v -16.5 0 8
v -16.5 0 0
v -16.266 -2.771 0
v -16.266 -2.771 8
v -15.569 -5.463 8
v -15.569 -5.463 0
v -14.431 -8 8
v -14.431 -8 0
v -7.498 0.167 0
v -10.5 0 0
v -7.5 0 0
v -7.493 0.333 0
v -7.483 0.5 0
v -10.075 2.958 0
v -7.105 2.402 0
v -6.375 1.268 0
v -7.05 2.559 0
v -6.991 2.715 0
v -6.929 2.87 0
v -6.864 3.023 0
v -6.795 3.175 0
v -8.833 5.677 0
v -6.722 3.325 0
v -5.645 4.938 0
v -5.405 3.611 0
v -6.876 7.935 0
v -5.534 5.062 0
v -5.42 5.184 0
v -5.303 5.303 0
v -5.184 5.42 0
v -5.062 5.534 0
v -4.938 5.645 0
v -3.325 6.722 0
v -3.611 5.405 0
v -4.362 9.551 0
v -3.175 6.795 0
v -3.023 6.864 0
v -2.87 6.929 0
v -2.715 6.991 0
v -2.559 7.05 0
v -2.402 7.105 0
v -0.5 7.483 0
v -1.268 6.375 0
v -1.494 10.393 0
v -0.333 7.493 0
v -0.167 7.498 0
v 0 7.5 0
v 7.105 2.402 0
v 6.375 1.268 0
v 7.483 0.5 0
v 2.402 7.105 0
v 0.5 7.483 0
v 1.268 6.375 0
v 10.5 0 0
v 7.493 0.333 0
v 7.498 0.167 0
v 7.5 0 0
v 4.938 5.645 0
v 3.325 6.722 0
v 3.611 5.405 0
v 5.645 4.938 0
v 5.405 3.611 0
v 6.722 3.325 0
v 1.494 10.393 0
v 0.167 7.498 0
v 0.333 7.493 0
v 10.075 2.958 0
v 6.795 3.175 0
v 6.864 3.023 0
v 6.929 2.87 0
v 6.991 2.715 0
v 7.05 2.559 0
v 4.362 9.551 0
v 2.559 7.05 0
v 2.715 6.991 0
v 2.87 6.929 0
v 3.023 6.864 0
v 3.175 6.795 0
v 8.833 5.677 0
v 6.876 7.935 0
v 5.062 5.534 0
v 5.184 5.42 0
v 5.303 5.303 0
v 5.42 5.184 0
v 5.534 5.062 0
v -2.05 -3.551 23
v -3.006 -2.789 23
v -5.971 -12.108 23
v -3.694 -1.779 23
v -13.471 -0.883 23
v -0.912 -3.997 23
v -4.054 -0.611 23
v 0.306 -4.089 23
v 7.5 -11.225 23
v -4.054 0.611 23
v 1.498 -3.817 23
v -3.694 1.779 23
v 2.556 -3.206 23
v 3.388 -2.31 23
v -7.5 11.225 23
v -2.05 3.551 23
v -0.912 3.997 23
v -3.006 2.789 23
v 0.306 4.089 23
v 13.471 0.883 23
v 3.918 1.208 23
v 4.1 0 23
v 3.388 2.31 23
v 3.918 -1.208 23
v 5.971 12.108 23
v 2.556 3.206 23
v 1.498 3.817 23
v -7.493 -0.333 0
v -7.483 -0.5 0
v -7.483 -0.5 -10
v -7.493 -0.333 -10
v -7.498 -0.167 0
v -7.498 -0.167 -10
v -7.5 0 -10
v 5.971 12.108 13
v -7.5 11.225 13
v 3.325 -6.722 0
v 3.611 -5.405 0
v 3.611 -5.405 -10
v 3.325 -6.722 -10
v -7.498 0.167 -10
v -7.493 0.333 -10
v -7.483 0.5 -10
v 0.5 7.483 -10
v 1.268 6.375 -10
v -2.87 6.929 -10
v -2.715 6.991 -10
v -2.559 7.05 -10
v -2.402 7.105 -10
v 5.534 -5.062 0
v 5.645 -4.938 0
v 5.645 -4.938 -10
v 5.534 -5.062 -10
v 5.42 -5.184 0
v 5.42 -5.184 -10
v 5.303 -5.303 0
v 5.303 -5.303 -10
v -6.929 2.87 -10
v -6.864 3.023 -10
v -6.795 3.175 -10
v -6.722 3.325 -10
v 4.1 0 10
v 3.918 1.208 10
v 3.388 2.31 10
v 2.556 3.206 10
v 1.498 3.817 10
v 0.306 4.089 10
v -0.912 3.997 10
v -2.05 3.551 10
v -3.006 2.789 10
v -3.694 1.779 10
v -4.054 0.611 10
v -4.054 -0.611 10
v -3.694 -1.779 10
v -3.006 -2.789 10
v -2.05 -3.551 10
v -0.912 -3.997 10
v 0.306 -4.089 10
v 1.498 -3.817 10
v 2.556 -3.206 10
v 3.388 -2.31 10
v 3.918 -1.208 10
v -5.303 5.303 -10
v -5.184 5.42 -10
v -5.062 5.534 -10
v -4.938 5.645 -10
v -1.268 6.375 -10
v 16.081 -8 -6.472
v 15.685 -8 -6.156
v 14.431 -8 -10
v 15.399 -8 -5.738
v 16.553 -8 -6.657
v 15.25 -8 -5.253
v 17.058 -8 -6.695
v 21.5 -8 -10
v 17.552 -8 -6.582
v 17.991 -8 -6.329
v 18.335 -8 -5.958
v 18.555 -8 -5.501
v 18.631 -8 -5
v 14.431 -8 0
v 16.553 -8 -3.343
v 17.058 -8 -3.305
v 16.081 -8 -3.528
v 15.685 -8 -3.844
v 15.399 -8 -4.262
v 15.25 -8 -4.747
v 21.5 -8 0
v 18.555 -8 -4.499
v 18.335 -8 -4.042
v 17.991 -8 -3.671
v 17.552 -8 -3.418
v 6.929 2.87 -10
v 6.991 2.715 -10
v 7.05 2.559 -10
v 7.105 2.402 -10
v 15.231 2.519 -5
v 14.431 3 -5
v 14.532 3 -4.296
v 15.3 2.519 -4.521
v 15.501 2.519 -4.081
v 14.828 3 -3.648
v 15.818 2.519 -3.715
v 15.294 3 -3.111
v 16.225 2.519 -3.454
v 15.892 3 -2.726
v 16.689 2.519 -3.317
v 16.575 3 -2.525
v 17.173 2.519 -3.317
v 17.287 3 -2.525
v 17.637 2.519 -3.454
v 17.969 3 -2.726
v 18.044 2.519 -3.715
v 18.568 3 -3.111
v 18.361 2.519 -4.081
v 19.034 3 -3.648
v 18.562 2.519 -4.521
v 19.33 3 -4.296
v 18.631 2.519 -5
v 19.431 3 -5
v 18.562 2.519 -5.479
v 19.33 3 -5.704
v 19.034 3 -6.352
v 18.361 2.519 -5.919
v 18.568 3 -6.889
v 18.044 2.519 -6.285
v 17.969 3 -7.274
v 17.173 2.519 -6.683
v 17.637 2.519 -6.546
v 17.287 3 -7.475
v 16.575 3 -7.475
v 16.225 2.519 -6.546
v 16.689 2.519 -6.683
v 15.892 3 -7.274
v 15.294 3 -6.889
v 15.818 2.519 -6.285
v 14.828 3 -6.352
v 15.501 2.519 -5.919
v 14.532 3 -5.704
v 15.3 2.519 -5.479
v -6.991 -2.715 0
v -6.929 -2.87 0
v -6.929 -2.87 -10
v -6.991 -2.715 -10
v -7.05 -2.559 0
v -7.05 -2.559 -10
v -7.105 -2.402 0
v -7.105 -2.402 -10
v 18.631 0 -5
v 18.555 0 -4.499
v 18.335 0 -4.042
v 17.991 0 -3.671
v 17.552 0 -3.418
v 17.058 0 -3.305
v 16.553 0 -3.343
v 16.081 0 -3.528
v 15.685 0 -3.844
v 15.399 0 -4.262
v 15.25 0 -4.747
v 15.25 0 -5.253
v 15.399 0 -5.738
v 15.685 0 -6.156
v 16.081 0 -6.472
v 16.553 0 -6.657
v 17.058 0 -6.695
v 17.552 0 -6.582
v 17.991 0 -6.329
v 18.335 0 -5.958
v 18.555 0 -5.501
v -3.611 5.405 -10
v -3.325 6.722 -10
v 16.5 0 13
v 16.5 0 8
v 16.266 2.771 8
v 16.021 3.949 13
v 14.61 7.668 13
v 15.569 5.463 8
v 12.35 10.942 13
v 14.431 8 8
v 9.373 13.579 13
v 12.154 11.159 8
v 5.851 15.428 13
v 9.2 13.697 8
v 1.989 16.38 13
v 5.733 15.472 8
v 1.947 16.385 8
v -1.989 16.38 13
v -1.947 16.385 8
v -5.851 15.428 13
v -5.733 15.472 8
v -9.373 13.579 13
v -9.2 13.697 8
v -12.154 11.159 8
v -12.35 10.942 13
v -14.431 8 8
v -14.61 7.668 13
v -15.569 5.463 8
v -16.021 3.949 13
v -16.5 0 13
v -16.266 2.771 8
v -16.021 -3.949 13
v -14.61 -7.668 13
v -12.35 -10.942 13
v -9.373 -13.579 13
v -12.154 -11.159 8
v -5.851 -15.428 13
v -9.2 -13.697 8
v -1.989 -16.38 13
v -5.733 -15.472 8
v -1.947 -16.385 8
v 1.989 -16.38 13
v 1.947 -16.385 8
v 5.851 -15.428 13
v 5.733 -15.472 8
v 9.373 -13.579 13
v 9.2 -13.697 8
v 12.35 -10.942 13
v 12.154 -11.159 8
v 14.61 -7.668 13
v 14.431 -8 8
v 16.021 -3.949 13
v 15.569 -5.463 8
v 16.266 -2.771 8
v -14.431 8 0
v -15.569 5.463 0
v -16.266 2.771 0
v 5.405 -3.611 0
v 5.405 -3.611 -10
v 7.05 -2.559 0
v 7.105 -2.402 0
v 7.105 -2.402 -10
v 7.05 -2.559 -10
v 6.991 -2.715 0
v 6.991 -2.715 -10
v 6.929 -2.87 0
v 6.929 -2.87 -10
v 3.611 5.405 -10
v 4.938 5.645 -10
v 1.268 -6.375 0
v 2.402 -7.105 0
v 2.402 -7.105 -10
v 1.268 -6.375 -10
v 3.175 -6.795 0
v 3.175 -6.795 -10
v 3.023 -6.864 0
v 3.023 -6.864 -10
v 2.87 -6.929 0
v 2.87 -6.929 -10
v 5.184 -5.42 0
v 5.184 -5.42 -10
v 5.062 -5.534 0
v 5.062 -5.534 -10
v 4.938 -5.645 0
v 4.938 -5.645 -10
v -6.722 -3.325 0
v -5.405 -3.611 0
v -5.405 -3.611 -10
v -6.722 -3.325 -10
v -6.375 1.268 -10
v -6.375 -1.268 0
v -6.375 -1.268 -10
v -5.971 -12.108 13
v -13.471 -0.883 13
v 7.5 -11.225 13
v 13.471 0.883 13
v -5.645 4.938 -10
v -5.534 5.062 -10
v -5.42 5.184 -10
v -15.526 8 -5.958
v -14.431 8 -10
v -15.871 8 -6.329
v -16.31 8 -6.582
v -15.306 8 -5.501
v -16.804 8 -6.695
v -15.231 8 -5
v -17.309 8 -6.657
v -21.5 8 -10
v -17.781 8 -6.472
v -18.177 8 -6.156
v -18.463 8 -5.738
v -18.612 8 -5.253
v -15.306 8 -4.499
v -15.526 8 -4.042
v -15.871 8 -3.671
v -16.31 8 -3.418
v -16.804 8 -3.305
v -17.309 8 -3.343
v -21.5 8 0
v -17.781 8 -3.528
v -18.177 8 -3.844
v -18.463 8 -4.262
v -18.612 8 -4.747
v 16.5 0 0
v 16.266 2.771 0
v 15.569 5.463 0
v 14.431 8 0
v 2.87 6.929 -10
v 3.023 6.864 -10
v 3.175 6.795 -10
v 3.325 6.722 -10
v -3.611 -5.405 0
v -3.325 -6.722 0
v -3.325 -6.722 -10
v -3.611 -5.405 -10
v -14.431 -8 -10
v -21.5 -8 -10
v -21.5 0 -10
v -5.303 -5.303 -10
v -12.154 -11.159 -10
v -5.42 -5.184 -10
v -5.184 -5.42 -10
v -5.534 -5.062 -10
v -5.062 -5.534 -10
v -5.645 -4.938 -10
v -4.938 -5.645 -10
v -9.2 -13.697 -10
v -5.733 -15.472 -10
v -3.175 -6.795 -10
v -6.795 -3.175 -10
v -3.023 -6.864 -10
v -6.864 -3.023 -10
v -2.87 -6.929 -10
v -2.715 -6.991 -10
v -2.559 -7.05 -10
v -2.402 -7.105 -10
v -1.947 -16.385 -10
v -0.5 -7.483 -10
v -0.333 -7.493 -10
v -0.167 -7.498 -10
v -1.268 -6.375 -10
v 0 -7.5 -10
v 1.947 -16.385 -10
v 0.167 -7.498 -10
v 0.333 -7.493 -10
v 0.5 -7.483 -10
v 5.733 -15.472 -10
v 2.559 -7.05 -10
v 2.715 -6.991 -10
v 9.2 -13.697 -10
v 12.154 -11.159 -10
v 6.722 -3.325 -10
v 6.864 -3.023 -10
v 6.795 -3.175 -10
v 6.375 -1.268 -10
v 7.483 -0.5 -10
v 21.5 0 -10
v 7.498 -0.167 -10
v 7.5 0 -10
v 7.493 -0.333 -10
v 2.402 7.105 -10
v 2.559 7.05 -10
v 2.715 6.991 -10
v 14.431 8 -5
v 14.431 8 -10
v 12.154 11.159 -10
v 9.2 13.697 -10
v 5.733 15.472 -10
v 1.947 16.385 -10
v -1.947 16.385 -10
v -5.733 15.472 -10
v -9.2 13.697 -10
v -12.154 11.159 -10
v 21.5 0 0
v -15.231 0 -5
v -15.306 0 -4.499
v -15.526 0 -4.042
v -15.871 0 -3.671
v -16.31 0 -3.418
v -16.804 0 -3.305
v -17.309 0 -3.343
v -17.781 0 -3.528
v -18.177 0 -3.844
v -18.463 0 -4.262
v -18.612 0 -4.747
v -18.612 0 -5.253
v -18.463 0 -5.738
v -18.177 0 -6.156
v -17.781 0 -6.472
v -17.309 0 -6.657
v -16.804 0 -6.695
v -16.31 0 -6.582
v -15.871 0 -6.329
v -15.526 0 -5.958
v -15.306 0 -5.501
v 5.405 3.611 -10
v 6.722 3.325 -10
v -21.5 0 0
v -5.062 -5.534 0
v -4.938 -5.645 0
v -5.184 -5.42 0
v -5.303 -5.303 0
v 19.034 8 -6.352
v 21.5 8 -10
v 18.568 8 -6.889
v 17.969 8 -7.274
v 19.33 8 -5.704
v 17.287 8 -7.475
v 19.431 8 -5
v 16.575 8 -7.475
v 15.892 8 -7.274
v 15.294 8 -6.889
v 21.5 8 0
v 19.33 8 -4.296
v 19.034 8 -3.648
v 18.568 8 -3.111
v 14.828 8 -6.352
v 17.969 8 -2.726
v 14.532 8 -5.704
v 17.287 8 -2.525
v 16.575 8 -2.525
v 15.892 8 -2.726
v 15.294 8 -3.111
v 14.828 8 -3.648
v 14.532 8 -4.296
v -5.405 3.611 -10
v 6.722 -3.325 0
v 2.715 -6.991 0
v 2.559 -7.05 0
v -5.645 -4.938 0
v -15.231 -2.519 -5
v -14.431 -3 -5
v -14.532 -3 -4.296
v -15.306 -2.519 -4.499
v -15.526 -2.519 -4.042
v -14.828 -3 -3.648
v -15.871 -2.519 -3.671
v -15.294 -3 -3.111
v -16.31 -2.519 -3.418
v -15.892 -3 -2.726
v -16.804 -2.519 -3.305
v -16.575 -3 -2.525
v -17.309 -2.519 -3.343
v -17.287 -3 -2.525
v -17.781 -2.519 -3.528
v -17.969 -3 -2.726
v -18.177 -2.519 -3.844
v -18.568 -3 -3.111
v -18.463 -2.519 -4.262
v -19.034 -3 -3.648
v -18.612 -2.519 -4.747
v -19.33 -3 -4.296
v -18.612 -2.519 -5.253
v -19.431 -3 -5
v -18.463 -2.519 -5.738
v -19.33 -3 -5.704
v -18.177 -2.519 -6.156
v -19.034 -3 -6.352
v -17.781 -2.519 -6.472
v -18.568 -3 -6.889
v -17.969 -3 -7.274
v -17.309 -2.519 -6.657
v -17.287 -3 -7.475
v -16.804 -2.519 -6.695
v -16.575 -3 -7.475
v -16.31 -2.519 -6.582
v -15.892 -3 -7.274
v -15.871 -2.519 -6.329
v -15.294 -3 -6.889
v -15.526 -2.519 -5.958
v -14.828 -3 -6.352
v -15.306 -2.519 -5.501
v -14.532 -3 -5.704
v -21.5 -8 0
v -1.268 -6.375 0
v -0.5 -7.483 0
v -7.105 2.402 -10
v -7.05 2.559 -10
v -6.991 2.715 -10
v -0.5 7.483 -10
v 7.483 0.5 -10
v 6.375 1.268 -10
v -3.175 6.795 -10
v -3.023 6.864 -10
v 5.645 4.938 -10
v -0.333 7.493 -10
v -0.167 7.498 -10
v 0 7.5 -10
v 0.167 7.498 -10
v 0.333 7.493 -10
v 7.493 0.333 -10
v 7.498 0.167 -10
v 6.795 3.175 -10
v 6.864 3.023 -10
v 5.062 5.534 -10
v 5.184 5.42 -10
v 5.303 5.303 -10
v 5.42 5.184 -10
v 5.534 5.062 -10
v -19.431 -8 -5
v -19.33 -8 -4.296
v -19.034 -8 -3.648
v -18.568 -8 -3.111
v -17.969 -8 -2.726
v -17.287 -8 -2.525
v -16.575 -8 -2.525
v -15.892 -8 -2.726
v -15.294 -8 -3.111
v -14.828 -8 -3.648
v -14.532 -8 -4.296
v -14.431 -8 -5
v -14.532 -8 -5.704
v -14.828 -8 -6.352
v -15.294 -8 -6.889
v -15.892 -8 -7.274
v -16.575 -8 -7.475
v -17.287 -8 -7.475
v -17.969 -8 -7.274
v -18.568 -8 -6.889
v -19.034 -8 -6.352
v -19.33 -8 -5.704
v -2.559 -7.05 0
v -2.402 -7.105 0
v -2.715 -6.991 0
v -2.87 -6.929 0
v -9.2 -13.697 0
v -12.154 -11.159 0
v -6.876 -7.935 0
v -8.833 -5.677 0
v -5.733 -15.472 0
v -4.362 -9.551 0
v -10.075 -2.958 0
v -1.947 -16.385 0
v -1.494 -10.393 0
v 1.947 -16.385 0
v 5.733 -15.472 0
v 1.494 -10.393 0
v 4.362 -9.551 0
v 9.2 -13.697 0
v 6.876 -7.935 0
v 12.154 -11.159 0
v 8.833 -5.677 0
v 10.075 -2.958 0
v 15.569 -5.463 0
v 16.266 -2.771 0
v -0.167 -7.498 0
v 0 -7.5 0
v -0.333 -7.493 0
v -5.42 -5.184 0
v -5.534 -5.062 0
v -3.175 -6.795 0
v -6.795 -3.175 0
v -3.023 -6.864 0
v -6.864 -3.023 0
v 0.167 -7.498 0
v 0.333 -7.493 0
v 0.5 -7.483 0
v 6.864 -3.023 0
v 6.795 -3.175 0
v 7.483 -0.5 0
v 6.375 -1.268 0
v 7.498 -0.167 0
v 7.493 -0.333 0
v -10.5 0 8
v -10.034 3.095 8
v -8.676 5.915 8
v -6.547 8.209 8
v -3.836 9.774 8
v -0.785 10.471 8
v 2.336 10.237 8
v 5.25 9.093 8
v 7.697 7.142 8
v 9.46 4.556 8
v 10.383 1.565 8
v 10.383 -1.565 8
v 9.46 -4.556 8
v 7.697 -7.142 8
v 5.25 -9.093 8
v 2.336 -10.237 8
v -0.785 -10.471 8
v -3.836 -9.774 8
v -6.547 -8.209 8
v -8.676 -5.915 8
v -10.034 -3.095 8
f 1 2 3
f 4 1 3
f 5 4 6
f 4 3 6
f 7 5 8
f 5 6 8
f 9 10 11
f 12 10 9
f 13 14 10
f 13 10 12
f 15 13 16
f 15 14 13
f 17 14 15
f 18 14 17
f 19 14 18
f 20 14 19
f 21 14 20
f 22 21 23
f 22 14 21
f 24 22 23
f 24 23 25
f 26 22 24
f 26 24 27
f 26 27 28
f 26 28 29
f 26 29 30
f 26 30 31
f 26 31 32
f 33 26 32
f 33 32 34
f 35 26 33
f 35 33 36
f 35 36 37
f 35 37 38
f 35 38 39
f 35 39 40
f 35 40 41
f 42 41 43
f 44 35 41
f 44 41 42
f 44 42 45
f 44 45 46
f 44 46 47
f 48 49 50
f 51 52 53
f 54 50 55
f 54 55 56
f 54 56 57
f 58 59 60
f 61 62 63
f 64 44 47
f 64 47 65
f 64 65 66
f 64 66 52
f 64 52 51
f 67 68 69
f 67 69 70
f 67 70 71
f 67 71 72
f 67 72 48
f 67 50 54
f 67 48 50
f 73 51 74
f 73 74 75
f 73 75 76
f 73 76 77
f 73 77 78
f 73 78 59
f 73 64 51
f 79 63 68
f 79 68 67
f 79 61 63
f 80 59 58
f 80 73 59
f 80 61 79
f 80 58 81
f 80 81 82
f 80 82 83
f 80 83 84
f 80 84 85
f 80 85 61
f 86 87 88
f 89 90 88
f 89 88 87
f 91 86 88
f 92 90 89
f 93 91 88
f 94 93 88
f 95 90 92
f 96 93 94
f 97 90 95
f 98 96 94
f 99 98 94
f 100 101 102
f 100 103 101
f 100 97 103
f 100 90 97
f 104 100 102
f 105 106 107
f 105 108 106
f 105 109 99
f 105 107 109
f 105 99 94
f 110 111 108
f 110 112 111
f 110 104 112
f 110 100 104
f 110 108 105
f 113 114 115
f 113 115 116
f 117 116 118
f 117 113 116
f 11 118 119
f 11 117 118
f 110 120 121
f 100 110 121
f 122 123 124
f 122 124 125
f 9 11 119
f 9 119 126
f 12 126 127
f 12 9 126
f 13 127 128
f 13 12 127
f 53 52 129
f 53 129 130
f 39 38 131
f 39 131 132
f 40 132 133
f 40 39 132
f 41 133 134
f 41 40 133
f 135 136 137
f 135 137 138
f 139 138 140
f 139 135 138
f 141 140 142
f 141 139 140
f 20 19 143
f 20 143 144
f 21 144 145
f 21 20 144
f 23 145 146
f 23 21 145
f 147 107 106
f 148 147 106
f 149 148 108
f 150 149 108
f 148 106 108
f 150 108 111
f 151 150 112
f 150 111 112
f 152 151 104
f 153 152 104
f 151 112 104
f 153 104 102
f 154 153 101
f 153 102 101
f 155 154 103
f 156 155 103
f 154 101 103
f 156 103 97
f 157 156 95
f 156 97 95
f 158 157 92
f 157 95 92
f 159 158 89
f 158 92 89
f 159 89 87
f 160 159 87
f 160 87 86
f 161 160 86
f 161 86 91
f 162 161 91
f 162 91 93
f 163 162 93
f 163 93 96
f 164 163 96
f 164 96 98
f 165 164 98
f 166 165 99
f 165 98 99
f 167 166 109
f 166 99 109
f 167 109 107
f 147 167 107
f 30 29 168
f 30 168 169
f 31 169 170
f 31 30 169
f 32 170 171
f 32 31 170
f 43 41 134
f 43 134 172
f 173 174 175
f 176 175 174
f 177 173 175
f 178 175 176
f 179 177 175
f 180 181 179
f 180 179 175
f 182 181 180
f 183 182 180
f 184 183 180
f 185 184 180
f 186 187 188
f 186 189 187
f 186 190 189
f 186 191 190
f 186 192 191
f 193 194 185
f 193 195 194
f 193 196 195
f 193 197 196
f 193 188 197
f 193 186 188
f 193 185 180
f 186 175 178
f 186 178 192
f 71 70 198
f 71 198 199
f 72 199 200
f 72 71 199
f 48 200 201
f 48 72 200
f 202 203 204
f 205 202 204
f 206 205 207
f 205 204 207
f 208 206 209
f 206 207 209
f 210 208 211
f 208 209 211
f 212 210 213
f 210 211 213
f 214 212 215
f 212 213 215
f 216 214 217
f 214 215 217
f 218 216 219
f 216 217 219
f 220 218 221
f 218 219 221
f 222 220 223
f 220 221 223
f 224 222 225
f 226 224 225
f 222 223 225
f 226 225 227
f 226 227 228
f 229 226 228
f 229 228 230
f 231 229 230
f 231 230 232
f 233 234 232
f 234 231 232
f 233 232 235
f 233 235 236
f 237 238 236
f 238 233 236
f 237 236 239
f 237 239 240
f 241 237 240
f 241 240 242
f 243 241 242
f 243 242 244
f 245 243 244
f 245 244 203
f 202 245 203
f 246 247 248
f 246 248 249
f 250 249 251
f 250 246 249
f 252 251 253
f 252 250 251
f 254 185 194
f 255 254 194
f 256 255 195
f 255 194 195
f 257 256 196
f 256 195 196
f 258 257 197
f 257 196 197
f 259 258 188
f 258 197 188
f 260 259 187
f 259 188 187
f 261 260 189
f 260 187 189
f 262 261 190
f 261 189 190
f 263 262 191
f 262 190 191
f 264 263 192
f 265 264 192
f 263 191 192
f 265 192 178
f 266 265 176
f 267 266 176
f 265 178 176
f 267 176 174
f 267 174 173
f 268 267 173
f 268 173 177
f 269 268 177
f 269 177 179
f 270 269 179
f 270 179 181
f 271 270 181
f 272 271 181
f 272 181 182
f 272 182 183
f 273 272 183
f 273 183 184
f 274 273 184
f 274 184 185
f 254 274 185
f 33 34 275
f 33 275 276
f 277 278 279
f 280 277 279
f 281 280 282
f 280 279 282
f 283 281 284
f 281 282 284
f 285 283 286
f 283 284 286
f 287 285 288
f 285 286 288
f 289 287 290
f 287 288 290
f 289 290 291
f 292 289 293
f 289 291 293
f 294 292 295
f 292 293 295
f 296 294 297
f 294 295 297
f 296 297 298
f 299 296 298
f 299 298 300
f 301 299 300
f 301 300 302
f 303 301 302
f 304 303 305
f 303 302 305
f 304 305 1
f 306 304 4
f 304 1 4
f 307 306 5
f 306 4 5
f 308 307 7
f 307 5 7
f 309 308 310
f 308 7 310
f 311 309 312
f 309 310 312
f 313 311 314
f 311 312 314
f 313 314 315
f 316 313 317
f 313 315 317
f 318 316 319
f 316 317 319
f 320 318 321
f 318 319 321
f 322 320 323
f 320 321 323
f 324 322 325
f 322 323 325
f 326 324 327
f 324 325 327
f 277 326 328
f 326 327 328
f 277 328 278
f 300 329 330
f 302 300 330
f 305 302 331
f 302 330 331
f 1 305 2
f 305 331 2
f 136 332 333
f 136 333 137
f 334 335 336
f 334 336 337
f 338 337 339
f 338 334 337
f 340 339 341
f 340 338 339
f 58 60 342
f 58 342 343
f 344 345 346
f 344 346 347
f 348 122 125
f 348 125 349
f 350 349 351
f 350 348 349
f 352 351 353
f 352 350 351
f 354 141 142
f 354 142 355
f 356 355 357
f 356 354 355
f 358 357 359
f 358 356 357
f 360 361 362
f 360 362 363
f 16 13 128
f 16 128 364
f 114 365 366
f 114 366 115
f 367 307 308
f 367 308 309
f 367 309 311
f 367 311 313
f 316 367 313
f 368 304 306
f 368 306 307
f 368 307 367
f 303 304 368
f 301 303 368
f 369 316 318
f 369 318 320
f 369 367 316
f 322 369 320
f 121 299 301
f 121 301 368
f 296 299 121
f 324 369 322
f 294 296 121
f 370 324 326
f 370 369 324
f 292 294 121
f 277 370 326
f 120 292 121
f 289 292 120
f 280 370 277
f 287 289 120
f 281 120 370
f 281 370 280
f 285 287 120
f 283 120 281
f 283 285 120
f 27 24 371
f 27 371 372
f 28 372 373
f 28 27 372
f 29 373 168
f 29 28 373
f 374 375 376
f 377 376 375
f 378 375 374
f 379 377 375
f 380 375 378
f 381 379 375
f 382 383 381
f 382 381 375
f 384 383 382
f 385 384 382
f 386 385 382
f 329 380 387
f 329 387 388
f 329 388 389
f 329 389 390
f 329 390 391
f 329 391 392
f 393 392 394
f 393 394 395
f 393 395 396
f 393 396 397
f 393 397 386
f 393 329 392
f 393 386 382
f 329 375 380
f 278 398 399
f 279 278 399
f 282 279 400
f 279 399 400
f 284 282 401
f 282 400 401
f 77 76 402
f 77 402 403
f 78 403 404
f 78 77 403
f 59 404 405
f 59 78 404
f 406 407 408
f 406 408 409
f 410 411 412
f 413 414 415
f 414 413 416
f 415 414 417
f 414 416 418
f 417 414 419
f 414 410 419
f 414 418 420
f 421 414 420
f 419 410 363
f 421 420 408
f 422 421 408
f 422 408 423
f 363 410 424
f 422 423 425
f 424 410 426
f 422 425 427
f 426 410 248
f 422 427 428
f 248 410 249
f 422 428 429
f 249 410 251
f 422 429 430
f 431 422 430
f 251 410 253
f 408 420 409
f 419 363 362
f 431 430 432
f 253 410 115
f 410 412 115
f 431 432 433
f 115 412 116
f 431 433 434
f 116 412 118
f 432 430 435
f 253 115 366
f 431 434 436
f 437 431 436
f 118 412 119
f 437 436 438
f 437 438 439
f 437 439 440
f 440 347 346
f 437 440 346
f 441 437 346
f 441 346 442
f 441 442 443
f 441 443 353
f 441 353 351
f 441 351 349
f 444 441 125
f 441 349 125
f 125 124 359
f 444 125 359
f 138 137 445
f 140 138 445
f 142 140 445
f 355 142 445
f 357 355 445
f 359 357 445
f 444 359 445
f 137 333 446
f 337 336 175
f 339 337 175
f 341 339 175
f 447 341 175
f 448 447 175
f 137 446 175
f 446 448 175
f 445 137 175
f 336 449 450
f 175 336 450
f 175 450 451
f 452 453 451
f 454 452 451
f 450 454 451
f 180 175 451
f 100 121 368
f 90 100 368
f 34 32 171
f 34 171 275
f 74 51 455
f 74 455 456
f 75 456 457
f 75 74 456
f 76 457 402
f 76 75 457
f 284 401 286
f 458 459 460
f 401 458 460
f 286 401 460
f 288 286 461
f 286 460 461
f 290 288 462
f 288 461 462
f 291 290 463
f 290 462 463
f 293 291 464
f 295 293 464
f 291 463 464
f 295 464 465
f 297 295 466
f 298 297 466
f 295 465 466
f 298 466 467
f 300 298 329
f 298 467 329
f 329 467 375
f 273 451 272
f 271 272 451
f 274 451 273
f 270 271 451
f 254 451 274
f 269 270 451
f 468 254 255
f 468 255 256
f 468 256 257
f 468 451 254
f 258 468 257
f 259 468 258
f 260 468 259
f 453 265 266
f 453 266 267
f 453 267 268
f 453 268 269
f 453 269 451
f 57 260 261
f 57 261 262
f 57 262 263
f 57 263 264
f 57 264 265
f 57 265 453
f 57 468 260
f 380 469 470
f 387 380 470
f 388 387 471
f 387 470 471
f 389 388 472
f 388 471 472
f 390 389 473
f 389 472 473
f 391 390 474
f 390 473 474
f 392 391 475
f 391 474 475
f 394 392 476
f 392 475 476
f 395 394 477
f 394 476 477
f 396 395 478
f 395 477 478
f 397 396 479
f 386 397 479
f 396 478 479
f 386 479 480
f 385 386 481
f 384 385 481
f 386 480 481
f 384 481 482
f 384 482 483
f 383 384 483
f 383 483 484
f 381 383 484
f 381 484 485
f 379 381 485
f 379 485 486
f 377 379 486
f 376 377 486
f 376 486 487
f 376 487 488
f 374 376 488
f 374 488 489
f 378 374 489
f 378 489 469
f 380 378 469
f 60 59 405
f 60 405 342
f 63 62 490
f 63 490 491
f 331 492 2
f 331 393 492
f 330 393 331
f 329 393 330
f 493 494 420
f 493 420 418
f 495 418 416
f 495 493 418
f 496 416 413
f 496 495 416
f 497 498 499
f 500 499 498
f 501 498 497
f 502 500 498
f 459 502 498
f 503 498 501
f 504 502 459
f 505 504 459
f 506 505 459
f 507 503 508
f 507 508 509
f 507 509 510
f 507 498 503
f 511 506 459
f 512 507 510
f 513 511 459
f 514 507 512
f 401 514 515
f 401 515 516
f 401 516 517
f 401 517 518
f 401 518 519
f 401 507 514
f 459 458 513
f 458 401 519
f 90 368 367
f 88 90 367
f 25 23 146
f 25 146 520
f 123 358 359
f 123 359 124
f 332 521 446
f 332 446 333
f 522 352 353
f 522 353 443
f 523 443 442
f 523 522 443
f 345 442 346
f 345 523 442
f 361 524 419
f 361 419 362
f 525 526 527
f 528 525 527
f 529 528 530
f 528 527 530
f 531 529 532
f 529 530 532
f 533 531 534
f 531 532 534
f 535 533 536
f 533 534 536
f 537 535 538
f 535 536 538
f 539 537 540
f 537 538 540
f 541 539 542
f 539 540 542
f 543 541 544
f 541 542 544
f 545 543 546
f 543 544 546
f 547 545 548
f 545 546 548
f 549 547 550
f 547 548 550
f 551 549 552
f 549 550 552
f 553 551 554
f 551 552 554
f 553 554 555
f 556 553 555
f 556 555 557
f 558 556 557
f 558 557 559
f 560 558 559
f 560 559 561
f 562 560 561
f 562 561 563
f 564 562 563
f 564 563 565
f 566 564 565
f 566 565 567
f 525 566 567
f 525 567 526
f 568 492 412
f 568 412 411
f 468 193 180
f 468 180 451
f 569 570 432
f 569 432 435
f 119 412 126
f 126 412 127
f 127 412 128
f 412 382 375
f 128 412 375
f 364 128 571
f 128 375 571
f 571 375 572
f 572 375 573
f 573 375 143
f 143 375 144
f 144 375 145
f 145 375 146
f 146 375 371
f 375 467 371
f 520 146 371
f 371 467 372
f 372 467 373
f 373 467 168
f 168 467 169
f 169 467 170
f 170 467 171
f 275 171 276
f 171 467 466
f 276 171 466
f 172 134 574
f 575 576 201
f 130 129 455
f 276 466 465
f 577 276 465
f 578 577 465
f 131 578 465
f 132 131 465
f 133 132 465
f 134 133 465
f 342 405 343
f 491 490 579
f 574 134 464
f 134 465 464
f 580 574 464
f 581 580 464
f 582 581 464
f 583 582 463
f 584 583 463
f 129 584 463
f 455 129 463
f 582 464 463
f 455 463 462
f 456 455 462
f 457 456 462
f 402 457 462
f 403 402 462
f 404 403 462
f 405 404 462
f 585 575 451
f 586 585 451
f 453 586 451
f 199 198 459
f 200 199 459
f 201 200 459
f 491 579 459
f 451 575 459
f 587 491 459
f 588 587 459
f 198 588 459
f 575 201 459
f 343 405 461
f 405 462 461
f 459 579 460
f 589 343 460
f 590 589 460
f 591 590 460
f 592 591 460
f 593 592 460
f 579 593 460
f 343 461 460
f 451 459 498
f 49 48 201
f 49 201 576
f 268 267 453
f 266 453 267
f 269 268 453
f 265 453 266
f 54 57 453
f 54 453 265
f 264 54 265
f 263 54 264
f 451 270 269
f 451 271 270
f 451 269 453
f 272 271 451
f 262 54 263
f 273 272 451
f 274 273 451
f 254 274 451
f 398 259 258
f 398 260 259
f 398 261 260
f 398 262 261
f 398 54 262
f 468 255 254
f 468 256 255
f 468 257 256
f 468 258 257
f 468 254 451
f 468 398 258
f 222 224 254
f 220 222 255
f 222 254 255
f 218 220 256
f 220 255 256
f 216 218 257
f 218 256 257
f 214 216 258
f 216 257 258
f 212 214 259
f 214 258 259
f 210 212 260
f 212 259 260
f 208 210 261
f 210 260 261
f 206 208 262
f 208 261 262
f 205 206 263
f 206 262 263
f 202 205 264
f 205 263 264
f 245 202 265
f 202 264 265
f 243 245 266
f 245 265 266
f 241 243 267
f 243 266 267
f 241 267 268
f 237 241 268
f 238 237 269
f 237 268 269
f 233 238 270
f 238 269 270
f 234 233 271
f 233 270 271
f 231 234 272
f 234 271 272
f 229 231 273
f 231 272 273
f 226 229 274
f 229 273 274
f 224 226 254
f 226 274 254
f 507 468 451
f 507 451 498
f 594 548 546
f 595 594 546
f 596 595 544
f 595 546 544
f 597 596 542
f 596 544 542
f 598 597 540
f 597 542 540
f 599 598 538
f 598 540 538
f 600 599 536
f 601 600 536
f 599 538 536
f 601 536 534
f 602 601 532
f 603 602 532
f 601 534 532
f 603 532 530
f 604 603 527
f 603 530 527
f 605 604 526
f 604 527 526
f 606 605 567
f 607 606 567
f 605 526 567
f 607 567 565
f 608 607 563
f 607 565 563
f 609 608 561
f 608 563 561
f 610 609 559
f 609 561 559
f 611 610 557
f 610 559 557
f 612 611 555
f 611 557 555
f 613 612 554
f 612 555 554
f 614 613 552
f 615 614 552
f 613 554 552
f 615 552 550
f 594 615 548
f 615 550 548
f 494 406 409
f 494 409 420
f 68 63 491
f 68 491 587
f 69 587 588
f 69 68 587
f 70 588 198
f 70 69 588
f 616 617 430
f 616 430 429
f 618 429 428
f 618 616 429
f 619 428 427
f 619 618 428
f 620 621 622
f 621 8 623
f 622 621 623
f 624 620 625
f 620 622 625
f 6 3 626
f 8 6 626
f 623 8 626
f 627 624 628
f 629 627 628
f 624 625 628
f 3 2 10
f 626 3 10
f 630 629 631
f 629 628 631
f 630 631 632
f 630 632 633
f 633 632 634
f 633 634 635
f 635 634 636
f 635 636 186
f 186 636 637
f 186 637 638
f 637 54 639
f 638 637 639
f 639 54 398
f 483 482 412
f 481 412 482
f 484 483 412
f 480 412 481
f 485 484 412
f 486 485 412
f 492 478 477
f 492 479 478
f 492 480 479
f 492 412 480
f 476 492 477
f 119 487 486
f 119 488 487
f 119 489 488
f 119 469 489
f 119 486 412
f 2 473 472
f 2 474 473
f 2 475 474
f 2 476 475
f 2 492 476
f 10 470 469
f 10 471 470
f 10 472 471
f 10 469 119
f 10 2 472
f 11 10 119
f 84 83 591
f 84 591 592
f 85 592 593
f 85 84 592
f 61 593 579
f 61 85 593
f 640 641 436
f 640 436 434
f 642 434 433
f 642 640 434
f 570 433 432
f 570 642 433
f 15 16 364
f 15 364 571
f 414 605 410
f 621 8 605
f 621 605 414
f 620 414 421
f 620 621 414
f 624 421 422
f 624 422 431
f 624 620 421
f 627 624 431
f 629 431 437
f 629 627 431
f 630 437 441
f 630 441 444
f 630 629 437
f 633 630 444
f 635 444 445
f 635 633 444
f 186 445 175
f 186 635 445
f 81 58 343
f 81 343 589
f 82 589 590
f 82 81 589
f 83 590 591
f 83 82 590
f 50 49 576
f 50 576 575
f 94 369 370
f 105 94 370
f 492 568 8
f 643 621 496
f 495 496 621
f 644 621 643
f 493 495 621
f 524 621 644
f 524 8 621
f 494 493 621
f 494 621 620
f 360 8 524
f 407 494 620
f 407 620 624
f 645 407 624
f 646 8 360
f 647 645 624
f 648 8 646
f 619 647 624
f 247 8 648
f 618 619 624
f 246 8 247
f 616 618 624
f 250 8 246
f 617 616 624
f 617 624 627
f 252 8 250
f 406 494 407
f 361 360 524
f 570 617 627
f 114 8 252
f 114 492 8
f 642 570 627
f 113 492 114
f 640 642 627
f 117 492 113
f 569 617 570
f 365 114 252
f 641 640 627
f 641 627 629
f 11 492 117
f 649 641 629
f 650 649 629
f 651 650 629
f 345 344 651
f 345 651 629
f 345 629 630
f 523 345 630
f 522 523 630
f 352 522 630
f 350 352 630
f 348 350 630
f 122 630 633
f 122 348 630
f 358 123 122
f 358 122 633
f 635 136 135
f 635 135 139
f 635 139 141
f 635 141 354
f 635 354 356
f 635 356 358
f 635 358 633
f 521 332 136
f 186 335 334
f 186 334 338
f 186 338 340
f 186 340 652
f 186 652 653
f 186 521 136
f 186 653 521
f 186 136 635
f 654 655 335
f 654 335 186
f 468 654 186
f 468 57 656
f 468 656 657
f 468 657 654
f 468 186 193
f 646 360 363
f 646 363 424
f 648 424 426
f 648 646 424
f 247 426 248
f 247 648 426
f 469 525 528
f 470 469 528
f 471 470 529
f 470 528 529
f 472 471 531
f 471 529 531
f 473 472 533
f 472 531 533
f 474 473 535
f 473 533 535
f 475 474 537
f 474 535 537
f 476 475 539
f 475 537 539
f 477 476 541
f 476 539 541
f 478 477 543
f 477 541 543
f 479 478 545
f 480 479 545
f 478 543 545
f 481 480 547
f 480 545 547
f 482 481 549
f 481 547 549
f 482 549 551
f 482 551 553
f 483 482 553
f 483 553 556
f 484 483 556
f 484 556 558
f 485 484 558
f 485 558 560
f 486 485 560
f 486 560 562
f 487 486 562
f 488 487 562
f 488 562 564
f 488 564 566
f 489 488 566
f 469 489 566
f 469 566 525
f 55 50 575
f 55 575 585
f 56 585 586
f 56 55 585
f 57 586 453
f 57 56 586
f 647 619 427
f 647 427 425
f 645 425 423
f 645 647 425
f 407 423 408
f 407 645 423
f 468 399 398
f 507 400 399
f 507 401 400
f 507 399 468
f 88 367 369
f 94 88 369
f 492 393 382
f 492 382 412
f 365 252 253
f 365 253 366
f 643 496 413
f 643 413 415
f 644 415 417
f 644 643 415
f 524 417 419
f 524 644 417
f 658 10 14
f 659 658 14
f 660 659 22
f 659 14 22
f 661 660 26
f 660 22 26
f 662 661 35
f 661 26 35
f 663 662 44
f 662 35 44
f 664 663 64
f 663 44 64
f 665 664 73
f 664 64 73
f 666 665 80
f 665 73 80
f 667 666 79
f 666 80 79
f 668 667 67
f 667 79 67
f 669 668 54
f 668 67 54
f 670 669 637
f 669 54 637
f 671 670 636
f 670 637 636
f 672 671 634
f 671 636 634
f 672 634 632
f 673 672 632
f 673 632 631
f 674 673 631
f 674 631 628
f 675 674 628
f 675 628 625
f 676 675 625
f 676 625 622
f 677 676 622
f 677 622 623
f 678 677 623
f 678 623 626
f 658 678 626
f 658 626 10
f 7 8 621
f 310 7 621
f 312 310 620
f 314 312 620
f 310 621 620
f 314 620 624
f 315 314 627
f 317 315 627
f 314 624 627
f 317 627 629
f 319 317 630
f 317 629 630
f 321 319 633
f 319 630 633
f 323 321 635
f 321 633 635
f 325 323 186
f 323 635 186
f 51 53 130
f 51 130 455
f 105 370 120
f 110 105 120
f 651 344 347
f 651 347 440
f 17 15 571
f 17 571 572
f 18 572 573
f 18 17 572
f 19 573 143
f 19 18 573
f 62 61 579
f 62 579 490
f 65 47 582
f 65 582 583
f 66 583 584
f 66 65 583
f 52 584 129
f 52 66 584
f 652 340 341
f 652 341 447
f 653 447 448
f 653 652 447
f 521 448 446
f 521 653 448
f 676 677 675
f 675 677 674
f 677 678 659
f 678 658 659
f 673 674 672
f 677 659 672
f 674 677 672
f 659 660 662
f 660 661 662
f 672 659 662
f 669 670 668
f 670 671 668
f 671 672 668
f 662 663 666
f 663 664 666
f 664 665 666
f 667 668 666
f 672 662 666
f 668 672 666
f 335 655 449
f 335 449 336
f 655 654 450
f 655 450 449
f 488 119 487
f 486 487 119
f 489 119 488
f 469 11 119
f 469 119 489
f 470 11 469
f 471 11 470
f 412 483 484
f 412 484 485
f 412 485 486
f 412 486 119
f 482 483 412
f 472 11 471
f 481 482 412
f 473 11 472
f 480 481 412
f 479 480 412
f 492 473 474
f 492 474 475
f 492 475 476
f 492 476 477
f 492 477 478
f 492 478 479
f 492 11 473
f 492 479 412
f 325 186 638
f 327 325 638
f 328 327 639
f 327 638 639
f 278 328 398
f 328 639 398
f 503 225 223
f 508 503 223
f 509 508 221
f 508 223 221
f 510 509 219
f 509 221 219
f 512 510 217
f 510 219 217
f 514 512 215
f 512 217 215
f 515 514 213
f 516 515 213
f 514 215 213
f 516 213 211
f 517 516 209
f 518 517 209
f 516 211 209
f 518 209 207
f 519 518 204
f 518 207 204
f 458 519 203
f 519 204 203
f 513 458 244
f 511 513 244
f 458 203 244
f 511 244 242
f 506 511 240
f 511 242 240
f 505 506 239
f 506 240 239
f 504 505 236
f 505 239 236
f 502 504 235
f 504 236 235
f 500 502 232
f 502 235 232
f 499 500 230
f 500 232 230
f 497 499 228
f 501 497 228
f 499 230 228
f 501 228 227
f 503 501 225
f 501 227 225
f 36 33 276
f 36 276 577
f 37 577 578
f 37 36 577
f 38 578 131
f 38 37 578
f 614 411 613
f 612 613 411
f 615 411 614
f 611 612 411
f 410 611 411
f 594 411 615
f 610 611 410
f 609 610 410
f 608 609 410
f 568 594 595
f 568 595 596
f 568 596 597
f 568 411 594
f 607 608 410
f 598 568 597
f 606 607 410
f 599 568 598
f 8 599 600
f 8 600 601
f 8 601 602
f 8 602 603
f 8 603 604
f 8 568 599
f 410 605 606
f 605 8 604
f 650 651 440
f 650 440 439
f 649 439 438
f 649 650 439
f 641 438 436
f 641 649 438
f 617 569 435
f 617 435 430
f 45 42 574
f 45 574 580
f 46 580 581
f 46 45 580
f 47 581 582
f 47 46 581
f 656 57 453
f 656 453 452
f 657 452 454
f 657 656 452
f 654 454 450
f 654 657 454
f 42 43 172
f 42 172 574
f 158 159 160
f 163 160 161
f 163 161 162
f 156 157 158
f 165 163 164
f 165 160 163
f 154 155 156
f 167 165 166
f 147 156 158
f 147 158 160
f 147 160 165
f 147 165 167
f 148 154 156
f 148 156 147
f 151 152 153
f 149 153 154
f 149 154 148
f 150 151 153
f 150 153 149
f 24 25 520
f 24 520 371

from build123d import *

# Parameters (mm, degrees)
F1_DEPTH       = 10
F2_DEPTH       = 10
F3_DEPTH       = 8
F5_D           = 3.4
F5_2_D         = 3.4
F7_D           = 5
F7_DEPTH       = 5
F7_TIP         = 1.5021515476
F7_ON_F6_D     = 5
F7_ON_F6_DEPTH = 5
F7_ON_F6_TIP   = 1.5021515476
F8_R           = 16.5
F8_R_2         = 10.5
F9_DEPTH       = 5
F11_DEPTH      = 10
F12_R          = 4.1
F13_DEPTH      = 13


# Not quite as in the source:
# - a feature names something its author has since deleted; it is built from what else it names


with BuildPart() as f1:
    # F0 (on Top) → F1 (new body)
    with BuildSketch(Plane.XY):
        with BuildLine():
            ThreePointArc((7.4833333333, 0.499722145), (7.4958321753, 0.25), (7.5, 0))
            Line((7.5, 0), (10.5, 0))
            ThreePointArc((10.5, 0), (0, 10.5), (-10.5, 0))
            Line((-10.5, 0), (-7.5, 0))
            ThreePointArc((-7.5, 0), (-7.4958321753, 0.25), (-7.4833333333, 0.499722145))
            ThreePointArc((-7.4833333333, 0.499722145), (-7.355889603, 1.4631774151), (-7.1049338873, 2.4020646238))
            ThreePointArc((-7.1049338873, 2.4020646238), (-7.020916784, 2.6375609021), (-6.9290964938, 2.8701257427))
            ThreePointArc((-6.9290964938, 2.8701257427), (-6.8295750678, 3.0995006684), (-6.7224631159, 3.3254307473))
            ThreePointArc((-6.7224631159, 3.3254307473), (-6.2360220923, 4.1667767476), (-5.6448726633, 4.9381588284))
            ThreePointArc((-5.6448726633, 4.9381588284), (-5.4771304571, 5.1235770665), (-5.3033008589, 5.3033008589))
            ThreePointArc((-5.3033008589, 5.3033008589), (-5.1235770665, 5.4771304571), (-4.9381588284, 5.6448726633))
            ThreePointArc((-4.9381588284, 5.6448726633), (-4.1667767476, 6.2360220923), (-3.3254307473, 6.7224631159))
            ThreePointArc((-3.3254307473, 6.7224631159), (-3.0995006684, 6.8295750678), (-2.8701257427, 6.9290964938))
            ThreePointArc((-2.8701257427, 6.9290964938), (-2.6375609021, 7.020916784), (-2.4020646238, 7.1049338873))
            ThreePointArc((-2.4020646238, 7.1049338873), (-1.4631774151, 7.355889603), (-0.499722145, 7.4833333333))
            ThreePointArc((-0.499722145, 7.4833333333), (-0.25, 7.4958321753), (0, 7.5))
            ThreePointArc((0, 7.5), (0.25, 7.4958321753), (0.499722145, 7.4833333333))
            ThreePointArc((0.499722145, 7.4833333333), (1.4631774151, 7.355889603), (2.4020646238, 7.1049338873))
            ThreePointArc((2.4020646238, 7.1049338873), (2.6375609021, 7.020916784), (2.8701257427, 6.9290964938))
            ThreePointArc((2.8701257427, 6.9290964938), (3.0995006684, 6.8295750678), (3.3254307473, 6.7224631159))
            ThreePointArc((3.3254307473, 6.7224631159), (4.1667767476, 6.2360220923), (4.9381588284, 5.6448726633))
            ThreePointArc((4.9381588284, 5.6448726633), (5.1235770665, 5.4771304571), (5.3033008589, 5.3033008589))
            ThreePointArc((5.3033008589, 5.3033008589), (5.4771304571, 5.1235770665), (5.6448726633, 4.9381588284))
            ThreePointArc((5.6448726633, 4.9381588284), (6.2360220923, 4.1667767476), (6.7224631159, 3.3254307473))
            ThreePointArc((6.7224631159, 3.3254307473), (6.8295750678, 3.0995006684), (6.9290964938, 2.8701257427))
            ThreePointArc((6.9290964938, 2.8701257427), (7.020916784, 2.6375609021), (7.1049338873, 2.4020646238))
            ThreePointArc((7.1049338873, 2.4020646238), (7.355889603, 1.4631774151), (7.4833333333, 0.499722145))
        make_face()
        with BuildLine():
            ThreePointArc((-10.5, 0), (0, 10.5), (10.5, 0))
            Line((10.5, 0), (16.5, 0))
            ThreePointArc((16.5, 0), (15.9743442726, 4.1316249903), (14.4308696897, 8))
            ThreePointArc((14.4308696897, 8), (0, 16.5), (-14.4308696897, 8))
            ThreePointArc((-14.4308696897, 8), (-15.9743442726, 4.1316249903), (-16.5, 0))
            Line((-16.5, 0), (-10.5, 0))
        make_face()
        with BuildLine():
            ThreePointArc((14.4308696897, 8), (15.9743442726, 4.1316249903), (16.5, 0))
            Line((16.5, 0), (21.5, 0))
            Line((21.5, 0), (21.5, 8))
            Line((21.5, 8), (14.4308696897, 8))
        make_face()
        with BuildLine():
            Line((-21.5, 0), (-16.5, 0))
            ThreePointArc((-16.5, 0), (-15.9743442726, 4.1316249903), (-14.4308696897, 8))
            Line((-14.4308696897, 8), (-21.5, 8))
            Line((-21.5, 8), (-21.5, 0))
        make_face()
        with BuildLine():
            ThreePointArc((-7.1049338873, 2.4020646238), (-7.355889603, 1.4631774151), (-7.4833333333, 0.499722145))
            Line((-7.4833333333, 0.499722145), (-6.3751043226, 1.2680870931))
            Line((-6.3751043226, 1.2680870931), (-7.1049338873, 2.4020646238))
        make_face()
        with BuildLine():
            ThreePointArc((-5.6448726633, 4.9381588284), (-6.2360220923, 4.1667767476), (-6.7224631159, 3.3254307473))
            Line((-6.7224631159, 3.3254307473), (-5.40455248, 3.6112065146))
            Line((-5.40455248, 3.6112065146), (-5.6448726633, 4.9381588284))
        make_face()
        with BuildLine():
            ThreePointArc((-3.3254307473, 6.7224631159), (-4.1667767476, 6.2360220923), (-4.9381588284, 5.6448726633))
            Line((-4.9381588284, 5.6448726633), (-3.6112065146, 5.40455248))
            Line((-3.6112065146, 5.40455248), (-3.3254307473, 6.7224631159))
        make_face()
        with BuildLine():
            Line((-1.2680870931, 6.3751043226), (-0.499722145, 7.4833333333))
            ThreePointArc((-0.499722145, 7.4833333333), (-1.4631774151, 7.355889603), (-2.4020646238, 7.1049338873))
            Line((-2.4020646238, 7.1049338873), (-1.2680870931, 6.3751043226))
        make_face()
        with BuildLine():
            Line((1.2680870931, 6.3751043226), (2.4020646238, 7.1049338873))
            ThreePointArc((2.4020646238, 7.1049338873), (1.4631774151, 7.355889603), (0.499722145, 7.4833333333))
            Line((0.499722145, 7.4833333333), (1.2680870931, 6.3751043226))
        make_face()
        with BuildLine():
            Line((3.6112065146, 5.40455248), (4.9381588284, 5.6448726633))
            ThreePointArc((4.9381588284, 5.6448726633), (4.1667767476, 6.2360220923), (3.3254307473, 6.7224631159))
            Line((3.3254307473, 6.7224631159), (3.6112065146, 5.40455248))
        make_face()
        with BuildLine():
            Line((5.40455248, 3.6112065146), (6.7224631159, 3.3254307473))
            ThreePointArc((6.7224631159, 3.3254307473), (6.2360220923, 4.1667767476), (5.6448726633, 4.9381588284))
            Line((5.6448726633, 4.9381588284), (5.40455248, 3.6112065146))
        make_face()
        with BuildLine():
            Line((6.3751043226, 1.2680870931), (7.4833333333, 0.499722145))
            ThreePointArc((7.4833333333, 0.499722145), (7.355889603, 1.4631774151), (7.1049338873, 2.4020646238))
            Line((7.1049338873, 2.4020646238), (6.3751043226, 1.2680870931))
        make_face()
    extrude(amount=-F1_DEPTH)

    # F0 (on Top) → F3 (join)
    with BuildSketch(Plane.XY):
        with BuildLine():
            Line((16.5, 0), (10.5, 0))
            ThreePointArc((10.5, 0), (0, -10.5), (-10.5, 0))
            Line((-10.5, 0), (-16.5, 0))
            ThreePointArc((-16.5, 0), (-15.9743442726, -4.1316249903), (-14.4308696897, -8))
            ThreePointArc((-14.4308696897, -8), (0, -16.5), (14.4308696897, -8))
            ThreePointArc((14.4308696897, -8), (15.9743442726, -4.1316249903), (16.5, 0))
        make_face()
        with BuildLine():
            ThreePointArc((-10.5, 0), (0, 10.5), (10.5, 0))
            Line((10.5, 0), (16.5, 0))
            ThreePointArc((16.5, 0), (15.9743442726, 4.1316249903), (14.4308696897, 8))
            ThreePointArc((14.4308696897, 8), (0, 16.5), (-14.4308696897, 8))
            ThreePointArc((-14.4308696897, 8), (-15.9743442726, 4.1316249903), (-16.5, 0))
            Line((-16.5, 0), (-10.5, 0))
        make_face()
    extrude(amount=F3_DEPTH)

    # F5 (through all)
    with Locations(Plane(origin=(0, 8, 0), x_dir=(-1, 0, 0), z_dir=(0, 1, 0))):
        with Locations((-16.9308696897, -5), (16.9308696897, -5)):
            Hole(F5_D / 2)

    # F7
    with Locations(Plane(origin=(0, 8, 0), x_dir=(-1, 0, 0), z_dir=(0, 1, 0))):
        with Locations((-16.9308696897, -5)):
            Hole(F7_D / 2, depth=F7_DEPTH)
            with Locations((0, 0, -(F7_DEPTH + F7_TIP / 2))):  # 118° drill point
                Cone(0, F7_D / 2, F7_TIP, mode=Mode.SUBTRACT)

    # F8 (on face) → F9 (join)
    with BuildSketch(Plane.XY.offset(8)):
        Circle(F8_R)
        Circle(F8_R_2, mode=Mode.SUBTRACT)
        Circle(F8_R_2)
    extrude(amount=F9_DEPTH)

    # F10 (on face) → F11 (join)
    with BuildSketch(Plane.XY.offset(13)):
        Polygon((-7.5000816839, 11.2249175826), (-13.4711046238, -0.8828024774), (-5.9710229399, -12.10772006), (7.5000816839, -11.2249175826), (13.4711046238, 0.8828024774), (5.9710229399, 12.10772006), align=None)
    extrude(amount=F11_DEPTH)

    # F12 (on face) → F13 (cut, through all)
    with BuildSketch(Plane.XY.offset(23)):
        Circle(F12_R)
    extrude(amount=-F13_DEPTH, mode=Mode.SUBTRACT)


with BuildPart() as f2:
    # F0 (on Top) → F2 (new body, through all)
    with BuildSketch(Plane.XY):
        with BuildLine():
            Line((10.5, 0), (7.5, 0))
            ThreePointArc((7.5, 0), (7.4958321753, -0.25), (7.4833333333, -0.499722145))
            ThreePointArc((7.4833333333, -0.499722145), (7.355889603, -1.4631774151), (7.1049338873, -2.4020646238))
            ThreePointArc((7.1049338873, -2.4020646238), (7.020916784, -2.6375609021), (6.9290964938, -2.8701257427))
            ThreePointArc((6.9290964938, -2.8701257427), (6.8295750678, -3.0995006684), (6.7224631159, -3.3254307473))
            ThreePointArc((6.7224631159, -3.3254307473), (6.2360220923, -4.1667767476), (5.6448726633, -4.9381588284))
            ThreePointArc((5.6448726633, -4.9381588284), (5.4771304571, -5.1235770665), (5.3033008589, -5.3033008589))
            ThreePointArc((5.3033008589, -5.3033008589), (5.1235770665, -5.4771304571), (4.9381588284, -5.6448726633))
            ThreePointArc((4.9381588284, -5.6448726633), (4.1667767476, -6.2360220923), (3.3254307473, -6.7224631159))
            ThreePointArc((3.3254307473, -6.7224631159), (3.0995006684, -6.8295750678), (2.8701257427, -6.9290964938))
            ThreePointArc((2.8701257427, -6.9290964938), (2.6375609021, -7.020916784), (2.4020646238, -7.1049338873))
            ThreePointArc((2.4020646238, -7.1049338873), (1.4631774151, -7.355889603), (0.499722145, -7.4833333333))
            ThreePointArc((0.499722145, -7.4833333333), (0.25, -7.4958321753), (0, -7.5))
            ThreePointArc((0, -7.5), (-0.25, -7.4958321753), (-0.499722145, -7.4833333333))
            ThreePointArc((-0.499722145, -7.4833333333), (-1.4631774151, -7.355889603), (-2.4020646238, -7.1049338873))
            ThreePointArc((-2.4020646238, -7.1049338873), (-2.6375609021, -7.020916784), (-2.8701257427, -6.9290964938))
            ThreePointArc((-2.8701257427, -6.9290964938), (-3.0995006684, -6.8295750678), (-3.3254307473, -6.7224631159))
            ThreePointArc((-3.3254307473, -6.7224631159), (-4.1667767476, -6.2360220923), (-4.9381588284, -5.6448726633))
            ThreePointArc((-4.9381588284, -5.6448726633), (-5.1235770665, -5.4771304571), (-5.3033008589, -5.3033008589))
            ThreePointArc((-5.3033008589, -5.3033008589), (-5.4771304571, -5.1235770665), (-5.6448726633, -4.9381588284))
            ThreePointArc((-5.6448726633, -4.9381588284), (-6.2360220923, -4.1667767476), (-6.7224631159, -3.3254307473))
            ThreePointArc((-6.7224631159, -3.3254307473), (-6.8295750678, -3.0995006684), (-6.9290964938, -2.8701257427))
            ThreePointArc((-6.9290964938, -2.8701257427), (-7.020916784, -2.6375609021), (-7.1049338873, -2.4020646238))
            ThreePointArc((-7.1049338873, -2.4020646238), (-7.355889603, -1.4631774151), (-7.4833333333, -0.499722145))
            ThreePointArc((-7.4833333333, -0.499722145), (-7.4958321753, -0.25), (-7.5, 0))
            Line((-7.5, 0), (-10.5, 0))
            ThreePointArc((-10.5, 0), (0, -10.5), (10.5, 0))
        make_face()
        with BuildLine():
            Line((16.5, 0), (10.5, 0))
            ThreePointArc((10.5, 0), (0, -10.5), (-10.5, 0))
            Line((-10.5, 0), (-16.5, 0))
            ThreePointArc((-16.5, 0), (-15.9743442726, -4.1316249903), (-14.4308696897, -8))
            ThreePointArc((-14.4308696897, -8), (0, -16.5), (14.4308696897, -8))
            ThreePointArc((14.4308696897, -8), (15.9743442726, -4.1316249903), (16.5, 0))
        make_face()
        with BuildLine():
            ThreePointArc((-14.4308696897, -8), (-15.9743442726, -4.1316249903), (-16.5, 0))
            Line((-16.5, 0), (-21.5, 0))
            Line((-21.5, 0), (-21.5, -8))
            Line((-21.5, -8), (-14.4308696897, -8))
        make_face()
        with BuildLine():
            Line((21.5, 0), (16.5, 0))
            ThreePointArc((16.5, 0), (15.9743442726, -4.1316249903), (14.4308696897, -8))
            Line((14.4308696897, -8), (21.5, -8))
            Line((21.5, -8), (21.5, 0))
        make_face()
        with BuildLine():
            Line((-6.3751043226, -1.2680870931), (-7.4833333333, -0.499722145))
            ThreePointArc((-7.4833333333, -0.499722145), (-7.355889603, -1.4631774151), (-7.1049338873, -2.4020646238))
            Line((-7.1049338873, -2.4020646238), (-6.3751043226, -1.2680870931))
        make_face()
        with BuildLine():
            Line((-5.40455248, -3.6112065146), (-6.7224631159, -3.3254307473))
            ThreePointArc((-6.7224631159, -3.3254307473), (-6.2360220923, -4.1667767476), (-5.6448726633, -4.9381588284))
            Line((-5.6448726633, -4.9381588284), (-5.40455248, -3.6112065146))
        make_face()
        with BuildLine():
            Line((-3.6112065146, -5.40455248), (-4.9381588284, -5.6448726633))
            ThreePointArc((-4.9381588284, -5.6448726633), (-4.1667767476, -6.2360220923), (-3.3254307473, -6.7224631159))
            Line((-3.3254307473, -6.7224631159), (-3.6112065146, -5.40455248))
        make_face()
        with BuildLine():
            Line((-1.2680870931, -6.3751043226), (-2.4020646238, -7.1049338873))
            ThreePointArc((-2.4020646238, -7.1049338873), (-1.4631774151, -7.355889603), (-0.499722145, -7.4833333333))
            Line((-0.499722145, -7.4833333333), (-1.2680870931, -6.3751043226))
        make_face()
        with BuildLine():
            ThreePointArc((0.499722145, -7.4833333333), (1.4631774151, -7.355889603), (2.4020646238, -7.1049338873))
            Line((2.4020646238, -7.1049338873), (1.2680870931, -6.3751043226))
            Line((1.2680870931, -6.3751043226), (0.499722145, -7.4833333333))
        make_face()
        with BuildLine():
            ThreePointArc((3.3254307473, -6.7224631159), (4.1667767476, -6.2360220923), (4.9381588284, -5.6448726633))
            Line((4.9381588284, -5.6448726633), (3.6112065146, -5.40455248))
            Line((3.6112065146, -5.40455248), (3.3254307473, -6.7224631159))
        make_face()
        with BuildLine():
            ThreePointArc((5.6448726633, -4.9381588284), (6.2360220923, -4.1667767476), (6.7224631159, -3.3254307473))
            Line((6.7224631159, -3.3254307473), (5.40455248, -3.6112065146))
            Line((5.40455248, -3.6112065146), (5.6448726633, -4.9381588284))
        make_face()
        with BuildLine():
            ThreePointArc((7.1049338873, -2.4020646238), (7.355889603, -1.4631774151), (7.4833333333, -0.499722145))
            Line((7.4833333333, -0.499722145), (6.3751043226, -1.2680870931))
            Line((6.3751043226, -1.2680870931), (7.1049338873, -2.4020646238))
        make_face()
    extrude(amount=-F2_DEPTH)

    # F5#2 (through all)
    with Locations(Plane(origin=(0, 8, 0), x_dir=(-1, 0, 0), z_dir=(0, 1, 0))):
        with Locations((-16.9308696897, -5), (16.9308696897, -5)):
            Hole(F5_2_D / 2)

    # F7 on F6
    with Locations(Plane.XZ.offset(8)):
        with Locations((-16.9308696897, -5)):
            Hole(F7_ON_F6_D / 2, depth=F7_ON_F6_DEPTH)
            with Locations((0, 0, -(F7_ON_F6_DEPTH + F7_ON_F6_TIP / 2))):  # 118° drill point
                Cone(0, F7_ON_F6_D / 2, F7_ON_F6_TIP, mode=Mode.SUBTRACT)


solid = Compound([f1.part, f2.part])
